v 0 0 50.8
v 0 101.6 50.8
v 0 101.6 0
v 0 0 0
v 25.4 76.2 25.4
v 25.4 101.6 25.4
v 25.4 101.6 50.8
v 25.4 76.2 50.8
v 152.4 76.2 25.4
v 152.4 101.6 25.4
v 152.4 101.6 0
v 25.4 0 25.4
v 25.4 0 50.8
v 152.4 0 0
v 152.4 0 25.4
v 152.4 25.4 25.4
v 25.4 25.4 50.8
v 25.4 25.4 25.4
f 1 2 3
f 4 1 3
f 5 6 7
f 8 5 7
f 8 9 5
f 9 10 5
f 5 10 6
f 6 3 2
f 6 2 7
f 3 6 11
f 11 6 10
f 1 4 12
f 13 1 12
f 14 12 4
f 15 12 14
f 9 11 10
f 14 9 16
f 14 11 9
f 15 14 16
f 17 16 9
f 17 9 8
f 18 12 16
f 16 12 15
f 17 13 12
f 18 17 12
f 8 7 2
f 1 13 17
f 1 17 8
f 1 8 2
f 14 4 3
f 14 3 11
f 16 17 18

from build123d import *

# Parameters (mm, degrees)
F1_DEPTH = 101.6
F3_DEPTH = 25.4
F5_DEPTH = 25.4


with BuildPart() as f1:
    # F0 (on Front) → F1 (new body)
    with BuildSketch(Plane.XZ):
        Polygon((0, 50.8), (0, 0), (152.4, 0), (152.4, 25.4), (25.4, 25.4), (25.4, 50.8), align=None)
        Polygon((152.4, 25.4), (25.4, 50.8), (25.4, 25.4), align=None)
    extrude(amount=-F1_DEPTH)

    # F2 (on face) → F3 (cut)
    with BuildSketch(Plane.XZ):
        Polygon((152.4, 25.4), (25.4, 50.8), (25.4, 25.4), align=None)
    extrude(amount=-F3_DEPTH, mode=Mode.SUBTRACT)

    # F4 (on face) → F5 (cut)
    with BuildSketch(Plane(origin=(0, 101.6, 0), x_dir=(-1, 0, 0), z_dir=(0, 1, 0))):
        Polygon((-25.4, 25.4), (-25.4, 50.8), (-152.4, 25.4), align=None)
    extrude(amount=-F5_DEPTH, mode=Mode.SUBTRACT)


solid = f1.part
